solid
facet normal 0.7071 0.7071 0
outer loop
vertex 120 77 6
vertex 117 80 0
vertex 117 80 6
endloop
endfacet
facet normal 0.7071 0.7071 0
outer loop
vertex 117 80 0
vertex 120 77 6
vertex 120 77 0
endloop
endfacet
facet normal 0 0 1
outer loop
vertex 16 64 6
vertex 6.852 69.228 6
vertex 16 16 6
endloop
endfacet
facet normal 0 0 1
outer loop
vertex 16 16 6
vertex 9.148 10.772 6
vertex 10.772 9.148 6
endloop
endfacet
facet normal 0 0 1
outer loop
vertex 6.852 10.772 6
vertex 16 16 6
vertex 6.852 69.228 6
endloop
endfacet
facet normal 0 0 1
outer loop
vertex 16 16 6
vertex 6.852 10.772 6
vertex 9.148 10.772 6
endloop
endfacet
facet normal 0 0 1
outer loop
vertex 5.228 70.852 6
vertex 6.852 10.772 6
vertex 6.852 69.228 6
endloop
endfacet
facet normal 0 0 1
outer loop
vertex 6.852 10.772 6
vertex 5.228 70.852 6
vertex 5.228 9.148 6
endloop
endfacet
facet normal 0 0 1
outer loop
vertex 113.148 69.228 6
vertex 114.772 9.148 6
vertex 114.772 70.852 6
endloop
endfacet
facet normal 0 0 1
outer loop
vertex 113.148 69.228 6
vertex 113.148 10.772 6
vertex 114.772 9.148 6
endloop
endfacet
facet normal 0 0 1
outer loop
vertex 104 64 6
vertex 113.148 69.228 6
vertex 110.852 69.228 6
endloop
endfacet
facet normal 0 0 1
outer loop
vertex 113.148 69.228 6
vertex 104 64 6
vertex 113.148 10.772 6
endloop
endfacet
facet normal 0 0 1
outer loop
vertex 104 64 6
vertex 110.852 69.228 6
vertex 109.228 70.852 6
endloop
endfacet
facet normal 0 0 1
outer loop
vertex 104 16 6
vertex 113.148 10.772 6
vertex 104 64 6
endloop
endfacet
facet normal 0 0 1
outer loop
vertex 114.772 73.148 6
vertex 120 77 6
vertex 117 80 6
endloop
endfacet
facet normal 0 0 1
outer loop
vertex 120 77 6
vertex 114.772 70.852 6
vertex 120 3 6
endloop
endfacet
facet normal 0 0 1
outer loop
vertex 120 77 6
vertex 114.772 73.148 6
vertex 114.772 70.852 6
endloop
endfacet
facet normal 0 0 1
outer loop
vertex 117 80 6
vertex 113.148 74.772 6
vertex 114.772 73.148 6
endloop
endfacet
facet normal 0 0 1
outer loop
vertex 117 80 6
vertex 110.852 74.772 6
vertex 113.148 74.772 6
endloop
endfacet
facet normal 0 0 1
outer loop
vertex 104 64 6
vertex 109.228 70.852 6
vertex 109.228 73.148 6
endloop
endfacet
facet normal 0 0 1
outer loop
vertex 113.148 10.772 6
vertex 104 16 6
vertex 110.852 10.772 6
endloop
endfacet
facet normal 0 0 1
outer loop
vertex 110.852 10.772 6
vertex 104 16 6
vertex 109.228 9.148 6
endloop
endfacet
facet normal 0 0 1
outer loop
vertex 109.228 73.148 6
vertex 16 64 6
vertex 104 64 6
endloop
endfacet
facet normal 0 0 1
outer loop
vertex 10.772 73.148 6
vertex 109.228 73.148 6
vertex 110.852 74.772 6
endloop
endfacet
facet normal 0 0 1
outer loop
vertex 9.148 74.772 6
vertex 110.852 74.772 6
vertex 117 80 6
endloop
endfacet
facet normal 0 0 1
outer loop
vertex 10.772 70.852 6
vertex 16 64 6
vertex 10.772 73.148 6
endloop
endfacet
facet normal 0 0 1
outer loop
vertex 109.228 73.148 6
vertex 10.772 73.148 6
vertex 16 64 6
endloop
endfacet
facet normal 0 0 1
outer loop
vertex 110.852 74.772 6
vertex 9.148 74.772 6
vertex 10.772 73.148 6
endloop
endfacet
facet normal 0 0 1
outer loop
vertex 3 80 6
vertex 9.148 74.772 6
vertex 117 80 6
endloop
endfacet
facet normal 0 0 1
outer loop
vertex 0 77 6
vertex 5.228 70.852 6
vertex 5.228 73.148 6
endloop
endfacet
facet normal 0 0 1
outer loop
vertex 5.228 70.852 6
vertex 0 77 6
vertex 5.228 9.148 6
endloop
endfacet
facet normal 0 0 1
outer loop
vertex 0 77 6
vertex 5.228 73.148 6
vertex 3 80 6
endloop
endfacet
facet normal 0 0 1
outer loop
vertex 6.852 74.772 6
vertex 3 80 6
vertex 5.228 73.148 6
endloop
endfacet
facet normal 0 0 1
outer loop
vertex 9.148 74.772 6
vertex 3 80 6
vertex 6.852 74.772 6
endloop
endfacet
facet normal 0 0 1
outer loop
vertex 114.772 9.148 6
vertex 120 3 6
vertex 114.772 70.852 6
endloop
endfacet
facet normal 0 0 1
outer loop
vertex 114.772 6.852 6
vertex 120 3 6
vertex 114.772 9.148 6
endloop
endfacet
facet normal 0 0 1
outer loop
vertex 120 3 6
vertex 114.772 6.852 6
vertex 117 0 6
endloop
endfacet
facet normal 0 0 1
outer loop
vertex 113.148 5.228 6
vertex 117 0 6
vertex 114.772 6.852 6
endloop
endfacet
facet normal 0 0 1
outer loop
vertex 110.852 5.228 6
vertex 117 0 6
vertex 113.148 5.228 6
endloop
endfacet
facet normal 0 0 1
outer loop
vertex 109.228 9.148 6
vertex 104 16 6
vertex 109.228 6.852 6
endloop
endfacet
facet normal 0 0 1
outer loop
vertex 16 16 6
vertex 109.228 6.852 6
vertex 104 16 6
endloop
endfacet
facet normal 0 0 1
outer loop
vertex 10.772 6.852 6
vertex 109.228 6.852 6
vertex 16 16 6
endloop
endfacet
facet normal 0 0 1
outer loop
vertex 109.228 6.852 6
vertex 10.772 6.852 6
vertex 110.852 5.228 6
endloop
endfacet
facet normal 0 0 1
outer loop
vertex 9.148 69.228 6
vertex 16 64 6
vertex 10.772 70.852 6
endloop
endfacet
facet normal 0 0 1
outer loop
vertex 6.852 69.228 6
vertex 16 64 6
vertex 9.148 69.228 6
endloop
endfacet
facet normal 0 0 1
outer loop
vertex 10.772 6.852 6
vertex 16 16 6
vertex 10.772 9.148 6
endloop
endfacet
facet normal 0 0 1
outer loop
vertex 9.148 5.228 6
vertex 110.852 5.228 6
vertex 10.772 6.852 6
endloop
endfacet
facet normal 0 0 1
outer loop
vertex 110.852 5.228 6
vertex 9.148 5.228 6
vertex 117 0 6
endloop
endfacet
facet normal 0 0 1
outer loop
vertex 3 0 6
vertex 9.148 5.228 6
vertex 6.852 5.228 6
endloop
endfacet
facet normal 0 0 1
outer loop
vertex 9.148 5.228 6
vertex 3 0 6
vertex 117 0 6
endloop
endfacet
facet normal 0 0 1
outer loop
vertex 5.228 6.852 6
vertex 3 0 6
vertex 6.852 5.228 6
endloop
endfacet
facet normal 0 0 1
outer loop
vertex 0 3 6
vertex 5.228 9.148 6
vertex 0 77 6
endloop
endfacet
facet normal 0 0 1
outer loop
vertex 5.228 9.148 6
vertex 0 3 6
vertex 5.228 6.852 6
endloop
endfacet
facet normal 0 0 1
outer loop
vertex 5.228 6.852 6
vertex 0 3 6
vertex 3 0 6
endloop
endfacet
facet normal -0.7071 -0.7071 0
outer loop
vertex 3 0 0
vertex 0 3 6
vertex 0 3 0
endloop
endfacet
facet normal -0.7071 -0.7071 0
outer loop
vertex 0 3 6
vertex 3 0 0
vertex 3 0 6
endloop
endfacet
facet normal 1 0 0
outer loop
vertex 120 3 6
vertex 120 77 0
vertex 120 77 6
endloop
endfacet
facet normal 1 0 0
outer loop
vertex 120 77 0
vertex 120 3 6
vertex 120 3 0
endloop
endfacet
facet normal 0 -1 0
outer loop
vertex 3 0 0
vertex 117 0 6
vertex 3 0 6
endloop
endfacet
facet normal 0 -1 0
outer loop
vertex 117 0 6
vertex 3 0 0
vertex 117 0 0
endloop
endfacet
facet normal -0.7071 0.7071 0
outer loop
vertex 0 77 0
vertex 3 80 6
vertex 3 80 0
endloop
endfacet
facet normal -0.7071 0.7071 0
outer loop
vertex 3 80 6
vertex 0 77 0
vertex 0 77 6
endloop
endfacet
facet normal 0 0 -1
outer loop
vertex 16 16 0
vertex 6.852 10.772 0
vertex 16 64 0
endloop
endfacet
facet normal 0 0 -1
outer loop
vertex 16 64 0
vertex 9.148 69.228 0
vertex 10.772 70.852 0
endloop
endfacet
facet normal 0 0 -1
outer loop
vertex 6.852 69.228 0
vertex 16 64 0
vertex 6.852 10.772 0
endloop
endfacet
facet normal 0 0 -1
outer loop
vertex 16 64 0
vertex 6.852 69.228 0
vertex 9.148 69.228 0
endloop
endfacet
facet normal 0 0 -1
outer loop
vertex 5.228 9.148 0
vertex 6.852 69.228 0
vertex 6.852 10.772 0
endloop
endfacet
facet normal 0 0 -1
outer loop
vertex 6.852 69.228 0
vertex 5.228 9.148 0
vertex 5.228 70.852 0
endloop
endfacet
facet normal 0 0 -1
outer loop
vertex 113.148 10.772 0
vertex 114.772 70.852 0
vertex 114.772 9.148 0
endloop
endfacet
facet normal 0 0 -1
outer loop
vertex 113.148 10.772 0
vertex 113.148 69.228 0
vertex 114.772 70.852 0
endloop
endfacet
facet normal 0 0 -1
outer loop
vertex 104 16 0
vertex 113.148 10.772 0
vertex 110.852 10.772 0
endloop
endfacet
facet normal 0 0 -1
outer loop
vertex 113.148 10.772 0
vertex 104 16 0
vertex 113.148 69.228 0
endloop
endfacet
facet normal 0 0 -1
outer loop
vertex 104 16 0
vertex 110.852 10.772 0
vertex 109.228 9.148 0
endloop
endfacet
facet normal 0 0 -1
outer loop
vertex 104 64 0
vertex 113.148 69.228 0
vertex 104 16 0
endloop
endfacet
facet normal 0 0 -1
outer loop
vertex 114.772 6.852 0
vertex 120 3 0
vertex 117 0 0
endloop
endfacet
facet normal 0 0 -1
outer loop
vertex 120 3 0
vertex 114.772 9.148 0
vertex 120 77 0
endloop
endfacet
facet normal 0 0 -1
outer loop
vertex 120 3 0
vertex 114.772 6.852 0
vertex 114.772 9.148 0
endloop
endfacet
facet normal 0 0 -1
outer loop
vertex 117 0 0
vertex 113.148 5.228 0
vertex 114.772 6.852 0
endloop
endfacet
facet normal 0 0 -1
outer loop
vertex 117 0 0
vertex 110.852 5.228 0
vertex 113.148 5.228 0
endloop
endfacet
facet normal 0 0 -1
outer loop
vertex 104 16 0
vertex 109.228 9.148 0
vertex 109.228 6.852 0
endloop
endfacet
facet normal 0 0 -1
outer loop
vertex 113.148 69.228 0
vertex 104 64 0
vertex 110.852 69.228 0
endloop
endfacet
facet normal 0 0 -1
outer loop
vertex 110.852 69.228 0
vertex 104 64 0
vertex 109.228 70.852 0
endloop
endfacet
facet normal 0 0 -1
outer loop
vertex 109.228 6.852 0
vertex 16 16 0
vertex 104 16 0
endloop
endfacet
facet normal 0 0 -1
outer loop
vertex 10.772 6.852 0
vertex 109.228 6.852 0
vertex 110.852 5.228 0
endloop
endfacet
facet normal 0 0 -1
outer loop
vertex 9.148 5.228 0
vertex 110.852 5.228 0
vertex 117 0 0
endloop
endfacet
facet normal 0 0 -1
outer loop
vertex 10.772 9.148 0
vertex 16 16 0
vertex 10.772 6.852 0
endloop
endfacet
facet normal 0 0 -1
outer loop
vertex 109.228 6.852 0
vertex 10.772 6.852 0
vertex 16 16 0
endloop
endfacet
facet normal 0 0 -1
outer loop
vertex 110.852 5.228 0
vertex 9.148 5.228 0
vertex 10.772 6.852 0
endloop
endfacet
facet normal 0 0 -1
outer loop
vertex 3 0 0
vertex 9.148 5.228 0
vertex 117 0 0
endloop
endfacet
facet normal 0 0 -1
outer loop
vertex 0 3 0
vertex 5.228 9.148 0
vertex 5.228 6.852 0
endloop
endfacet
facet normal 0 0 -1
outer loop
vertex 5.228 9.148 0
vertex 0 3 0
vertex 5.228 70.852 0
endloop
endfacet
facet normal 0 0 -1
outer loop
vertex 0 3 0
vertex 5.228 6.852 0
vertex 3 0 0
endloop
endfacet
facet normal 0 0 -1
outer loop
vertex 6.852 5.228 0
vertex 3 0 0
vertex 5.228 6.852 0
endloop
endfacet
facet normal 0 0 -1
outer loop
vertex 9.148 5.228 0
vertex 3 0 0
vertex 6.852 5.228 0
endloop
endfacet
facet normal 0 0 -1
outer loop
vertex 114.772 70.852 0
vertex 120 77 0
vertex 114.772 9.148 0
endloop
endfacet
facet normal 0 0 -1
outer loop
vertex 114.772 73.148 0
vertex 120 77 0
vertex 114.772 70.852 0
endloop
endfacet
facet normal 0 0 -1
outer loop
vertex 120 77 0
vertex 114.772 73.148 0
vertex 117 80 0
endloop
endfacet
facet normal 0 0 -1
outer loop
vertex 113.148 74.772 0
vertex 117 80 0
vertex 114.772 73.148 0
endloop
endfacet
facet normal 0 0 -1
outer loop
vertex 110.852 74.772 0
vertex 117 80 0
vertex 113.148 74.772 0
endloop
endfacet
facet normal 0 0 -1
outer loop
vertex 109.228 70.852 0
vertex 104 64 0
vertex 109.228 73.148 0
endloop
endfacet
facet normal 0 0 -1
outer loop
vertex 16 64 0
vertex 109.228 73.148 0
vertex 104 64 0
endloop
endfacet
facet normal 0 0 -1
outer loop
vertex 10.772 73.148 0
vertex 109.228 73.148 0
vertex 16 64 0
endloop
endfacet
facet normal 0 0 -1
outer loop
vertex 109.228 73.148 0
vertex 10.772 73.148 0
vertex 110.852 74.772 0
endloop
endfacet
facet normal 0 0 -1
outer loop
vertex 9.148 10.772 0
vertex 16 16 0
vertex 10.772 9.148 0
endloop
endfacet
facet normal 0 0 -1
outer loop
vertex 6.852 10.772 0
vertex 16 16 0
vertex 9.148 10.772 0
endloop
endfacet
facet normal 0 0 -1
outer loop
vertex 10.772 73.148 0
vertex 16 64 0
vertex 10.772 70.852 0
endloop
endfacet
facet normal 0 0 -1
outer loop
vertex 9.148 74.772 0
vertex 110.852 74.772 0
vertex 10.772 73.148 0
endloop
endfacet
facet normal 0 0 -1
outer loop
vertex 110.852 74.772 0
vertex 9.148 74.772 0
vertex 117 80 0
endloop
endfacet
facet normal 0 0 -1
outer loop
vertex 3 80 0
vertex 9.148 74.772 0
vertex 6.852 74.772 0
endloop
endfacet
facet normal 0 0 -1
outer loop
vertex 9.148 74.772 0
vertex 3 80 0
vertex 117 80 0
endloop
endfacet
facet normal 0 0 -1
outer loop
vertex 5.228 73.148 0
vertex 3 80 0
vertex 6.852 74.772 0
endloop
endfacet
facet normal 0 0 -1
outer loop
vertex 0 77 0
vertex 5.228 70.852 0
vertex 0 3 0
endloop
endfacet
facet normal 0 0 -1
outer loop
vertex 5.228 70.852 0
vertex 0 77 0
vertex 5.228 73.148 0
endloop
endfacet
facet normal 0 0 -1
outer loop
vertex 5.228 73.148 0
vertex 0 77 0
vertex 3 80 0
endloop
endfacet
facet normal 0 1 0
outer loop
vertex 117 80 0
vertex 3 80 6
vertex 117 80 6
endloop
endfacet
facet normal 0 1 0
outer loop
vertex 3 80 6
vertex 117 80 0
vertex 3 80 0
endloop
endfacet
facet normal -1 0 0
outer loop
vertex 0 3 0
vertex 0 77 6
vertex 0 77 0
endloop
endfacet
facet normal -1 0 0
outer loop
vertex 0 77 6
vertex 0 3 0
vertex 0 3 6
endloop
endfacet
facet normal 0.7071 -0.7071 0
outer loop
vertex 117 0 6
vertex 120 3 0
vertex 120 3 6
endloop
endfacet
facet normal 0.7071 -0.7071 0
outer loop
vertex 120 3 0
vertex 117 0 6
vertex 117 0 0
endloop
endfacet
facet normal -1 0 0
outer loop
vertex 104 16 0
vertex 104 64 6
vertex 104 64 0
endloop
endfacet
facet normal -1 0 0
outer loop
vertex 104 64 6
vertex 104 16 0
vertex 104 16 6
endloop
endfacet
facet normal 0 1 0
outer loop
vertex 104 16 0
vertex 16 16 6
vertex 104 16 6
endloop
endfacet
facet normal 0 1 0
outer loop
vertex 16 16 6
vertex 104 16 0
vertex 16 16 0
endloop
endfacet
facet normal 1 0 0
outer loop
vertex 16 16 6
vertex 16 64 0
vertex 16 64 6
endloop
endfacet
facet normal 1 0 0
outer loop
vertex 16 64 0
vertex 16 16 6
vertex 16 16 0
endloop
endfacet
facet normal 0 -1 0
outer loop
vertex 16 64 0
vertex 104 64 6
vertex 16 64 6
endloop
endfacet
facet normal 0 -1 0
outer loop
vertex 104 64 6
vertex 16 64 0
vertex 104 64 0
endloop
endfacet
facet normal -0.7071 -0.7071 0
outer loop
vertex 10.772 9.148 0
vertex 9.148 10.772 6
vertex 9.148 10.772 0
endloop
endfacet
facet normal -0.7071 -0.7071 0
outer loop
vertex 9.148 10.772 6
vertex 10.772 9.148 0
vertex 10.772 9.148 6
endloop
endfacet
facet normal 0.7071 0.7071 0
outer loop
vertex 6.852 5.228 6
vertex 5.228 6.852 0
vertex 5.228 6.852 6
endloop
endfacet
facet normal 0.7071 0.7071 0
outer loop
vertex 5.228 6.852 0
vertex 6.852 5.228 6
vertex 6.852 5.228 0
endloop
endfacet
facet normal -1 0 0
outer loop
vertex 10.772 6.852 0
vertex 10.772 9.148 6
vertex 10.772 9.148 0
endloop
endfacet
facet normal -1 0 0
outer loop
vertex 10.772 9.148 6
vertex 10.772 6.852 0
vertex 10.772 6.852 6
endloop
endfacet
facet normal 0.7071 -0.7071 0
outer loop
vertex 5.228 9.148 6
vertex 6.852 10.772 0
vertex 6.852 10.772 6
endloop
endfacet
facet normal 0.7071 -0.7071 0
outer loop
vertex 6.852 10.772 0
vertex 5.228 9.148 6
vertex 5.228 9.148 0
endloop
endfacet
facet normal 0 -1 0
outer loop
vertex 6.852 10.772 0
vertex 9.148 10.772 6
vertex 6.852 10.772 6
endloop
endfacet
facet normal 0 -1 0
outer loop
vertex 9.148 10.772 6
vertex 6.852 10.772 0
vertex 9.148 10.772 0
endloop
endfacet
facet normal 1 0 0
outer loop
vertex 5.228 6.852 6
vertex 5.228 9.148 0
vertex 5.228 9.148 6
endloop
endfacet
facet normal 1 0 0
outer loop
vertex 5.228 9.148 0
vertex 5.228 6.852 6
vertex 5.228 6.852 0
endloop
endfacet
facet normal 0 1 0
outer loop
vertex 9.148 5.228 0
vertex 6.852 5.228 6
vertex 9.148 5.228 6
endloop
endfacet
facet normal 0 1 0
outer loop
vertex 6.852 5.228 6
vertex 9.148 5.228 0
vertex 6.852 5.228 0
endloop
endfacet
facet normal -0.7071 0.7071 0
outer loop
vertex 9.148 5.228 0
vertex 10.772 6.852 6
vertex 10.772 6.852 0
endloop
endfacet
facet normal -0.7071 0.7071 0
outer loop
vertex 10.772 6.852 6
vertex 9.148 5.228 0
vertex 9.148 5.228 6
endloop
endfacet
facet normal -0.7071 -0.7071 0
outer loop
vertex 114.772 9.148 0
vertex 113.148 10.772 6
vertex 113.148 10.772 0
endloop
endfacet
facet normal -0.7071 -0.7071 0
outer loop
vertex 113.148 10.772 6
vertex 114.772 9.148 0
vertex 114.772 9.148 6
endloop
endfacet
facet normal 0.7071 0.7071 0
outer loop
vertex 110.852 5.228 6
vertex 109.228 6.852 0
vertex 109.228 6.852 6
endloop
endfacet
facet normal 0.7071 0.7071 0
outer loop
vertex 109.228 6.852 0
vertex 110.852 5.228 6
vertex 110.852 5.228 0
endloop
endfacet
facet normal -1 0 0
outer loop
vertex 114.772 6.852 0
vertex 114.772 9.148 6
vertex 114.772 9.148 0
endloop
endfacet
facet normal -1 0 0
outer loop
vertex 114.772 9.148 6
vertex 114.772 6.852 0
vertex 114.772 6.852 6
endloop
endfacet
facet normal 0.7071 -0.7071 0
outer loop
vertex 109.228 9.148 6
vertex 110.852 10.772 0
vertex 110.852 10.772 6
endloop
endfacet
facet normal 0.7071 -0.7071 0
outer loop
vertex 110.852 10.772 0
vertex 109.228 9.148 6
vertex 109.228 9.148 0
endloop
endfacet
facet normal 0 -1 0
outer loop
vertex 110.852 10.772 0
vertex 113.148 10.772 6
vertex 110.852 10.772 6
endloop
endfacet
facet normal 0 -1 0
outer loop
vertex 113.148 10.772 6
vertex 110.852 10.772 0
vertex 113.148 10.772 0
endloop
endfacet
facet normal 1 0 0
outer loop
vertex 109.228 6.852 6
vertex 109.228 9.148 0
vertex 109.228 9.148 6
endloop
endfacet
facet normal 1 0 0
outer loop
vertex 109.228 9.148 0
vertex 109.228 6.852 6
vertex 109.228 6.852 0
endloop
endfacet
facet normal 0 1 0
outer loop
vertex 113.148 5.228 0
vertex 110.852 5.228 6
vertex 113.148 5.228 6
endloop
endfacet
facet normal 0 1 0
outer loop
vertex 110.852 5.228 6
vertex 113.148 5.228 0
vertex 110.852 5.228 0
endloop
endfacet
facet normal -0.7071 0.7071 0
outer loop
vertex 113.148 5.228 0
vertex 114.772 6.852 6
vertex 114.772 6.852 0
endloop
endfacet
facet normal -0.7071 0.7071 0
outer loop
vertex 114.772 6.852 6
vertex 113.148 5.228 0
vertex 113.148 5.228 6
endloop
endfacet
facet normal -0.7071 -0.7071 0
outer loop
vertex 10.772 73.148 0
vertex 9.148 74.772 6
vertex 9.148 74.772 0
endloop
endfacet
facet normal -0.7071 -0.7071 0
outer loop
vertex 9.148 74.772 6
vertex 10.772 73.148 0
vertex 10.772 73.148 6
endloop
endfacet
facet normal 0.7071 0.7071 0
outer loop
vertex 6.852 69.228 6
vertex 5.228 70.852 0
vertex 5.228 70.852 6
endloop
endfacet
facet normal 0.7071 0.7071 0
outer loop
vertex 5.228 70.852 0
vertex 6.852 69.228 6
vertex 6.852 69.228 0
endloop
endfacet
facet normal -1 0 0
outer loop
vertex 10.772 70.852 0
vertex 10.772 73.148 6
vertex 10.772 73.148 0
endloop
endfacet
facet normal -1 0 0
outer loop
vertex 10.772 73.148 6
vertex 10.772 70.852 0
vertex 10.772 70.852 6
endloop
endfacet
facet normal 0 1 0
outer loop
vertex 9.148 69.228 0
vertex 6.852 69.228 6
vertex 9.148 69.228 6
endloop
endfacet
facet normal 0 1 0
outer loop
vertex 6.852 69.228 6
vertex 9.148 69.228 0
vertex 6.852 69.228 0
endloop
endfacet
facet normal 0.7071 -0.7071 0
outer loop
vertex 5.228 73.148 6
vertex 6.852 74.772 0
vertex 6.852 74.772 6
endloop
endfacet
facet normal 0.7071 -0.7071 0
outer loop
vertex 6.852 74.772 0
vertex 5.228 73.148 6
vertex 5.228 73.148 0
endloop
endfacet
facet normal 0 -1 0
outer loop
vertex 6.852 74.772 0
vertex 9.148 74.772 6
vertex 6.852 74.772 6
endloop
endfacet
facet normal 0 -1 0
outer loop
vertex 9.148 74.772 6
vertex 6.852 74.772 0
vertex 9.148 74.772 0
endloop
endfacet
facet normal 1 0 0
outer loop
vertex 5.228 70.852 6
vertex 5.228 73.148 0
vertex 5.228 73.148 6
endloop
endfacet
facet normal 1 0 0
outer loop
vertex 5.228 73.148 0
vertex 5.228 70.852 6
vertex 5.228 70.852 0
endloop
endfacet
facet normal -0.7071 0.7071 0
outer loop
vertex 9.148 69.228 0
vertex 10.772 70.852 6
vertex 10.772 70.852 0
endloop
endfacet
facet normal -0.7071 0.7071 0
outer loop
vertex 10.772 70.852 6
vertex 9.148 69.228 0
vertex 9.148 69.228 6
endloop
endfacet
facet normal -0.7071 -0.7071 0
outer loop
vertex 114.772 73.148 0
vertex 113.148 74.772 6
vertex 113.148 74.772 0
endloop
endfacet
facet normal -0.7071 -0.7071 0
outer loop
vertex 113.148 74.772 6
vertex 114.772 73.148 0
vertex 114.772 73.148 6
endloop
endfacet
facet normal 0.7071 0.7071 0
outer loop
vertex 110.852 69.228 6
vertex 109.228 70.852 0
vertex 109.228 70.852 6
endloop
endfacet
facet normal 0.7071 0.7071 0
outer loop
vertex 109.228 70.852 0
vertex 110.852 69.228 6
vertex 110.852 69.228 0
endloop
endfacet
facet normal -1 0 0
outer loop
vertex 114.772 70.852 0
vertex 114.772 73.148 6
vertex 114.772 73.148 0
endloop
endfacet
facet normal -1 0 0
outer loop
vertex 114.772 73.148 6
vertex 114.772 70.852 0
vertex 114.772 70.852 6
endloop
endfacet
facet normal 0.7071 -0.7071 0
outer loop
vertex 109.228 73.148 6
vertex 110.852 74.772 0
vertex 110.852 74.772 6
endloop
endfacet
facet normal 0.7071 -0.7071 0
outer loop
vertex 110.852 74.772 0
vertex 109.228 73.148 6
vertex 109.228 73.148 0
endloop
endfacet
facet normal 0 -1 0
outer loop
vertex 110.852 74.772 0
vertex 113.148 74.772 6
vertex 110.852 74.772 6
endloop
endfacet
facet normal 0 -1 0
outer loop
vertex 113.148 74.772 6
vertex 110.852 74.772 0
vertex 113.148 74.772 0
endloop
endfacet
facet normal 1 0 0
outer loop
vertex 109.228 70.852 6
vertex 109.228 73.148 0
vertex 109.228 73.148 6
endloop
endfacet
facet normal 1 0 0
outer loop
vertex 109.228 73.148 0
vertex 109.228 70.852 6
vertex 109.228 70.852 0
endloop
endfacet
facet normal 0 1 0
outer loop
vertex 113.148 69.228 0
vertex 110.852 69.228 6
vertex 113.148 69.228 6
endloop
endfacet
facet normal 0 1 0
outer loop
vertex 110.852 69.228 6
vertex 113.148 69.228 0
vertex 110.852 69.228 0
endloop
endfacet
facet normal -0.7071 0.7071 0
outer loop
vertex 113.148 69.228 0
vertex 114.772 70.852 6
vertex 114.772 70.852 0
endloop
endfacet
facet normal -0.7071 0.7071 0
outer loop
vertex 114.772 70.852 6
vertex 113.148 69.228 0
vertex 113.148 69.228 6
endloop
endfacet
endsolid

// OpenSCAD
$fn = 32;

// ----------------------------------------------------------------------
// Frame plate: 120 x 80 frame, 16 mm rails
// ----------------------------------------------------------------------

// --- parameters (mm) ---
plate_l = 120;            // plate length, X
plate_w = 80;             // plate width, Y
plate_t = 6;              // plate thickness, Z (extrusion height)
corner_c = 3;             // corner chamfer
frame_bar = 16;           // frame rail width
bolt_r = 3;               // corner bolt window radius
bolt_inset = 8;           // bolt centre inset from the edges

win_l = plate_l - 2 * frame_bar;  // window length
win_w = plate_w - 2 * frame_bar;  // window width
bolt_d = 2 * bolt_r;  // corner hole diameter

profile = [[3, 0], [117, 0], [120, 3], [120, 77], [117, 80], [3, 80], [0, 77], [0, 3]];  // primary outline, 8 points, counter clockwise
void_1 = [[16, 16], [104, 16], [104, 64], [16, 64]];  // the window, 4 points
void_2 = [[10.772, 9.148], [9.148, 10.772], [6.852, 10.772], [5.228, 9.148], [5.228, 6.852], [6.852, 5.228], [9.148, 5.228], [10.772, 6.852]];  // corner bolt window, 8 points
void_3 = [[114.772, 9.148], [113.148, 10.772], [110.852, 10.772], [109.228, 9.148], [109.228, 6.852], [110.852, 5.228], [113.148, 5.228], [114.772, 6.852]];  // corner bolt window, 8 points
void_4 = [[10.772, 73.148], [9.148, 74.772], [6.852, 74.772], [5.228, 73.148], [5.228, 70.852], [6.852, 69.228], [9.148, 69.228], [10.772, 70.852]];  // corner bolt window, 8 points
void_5 = [[114.772, 73.148], [113.148, 74.772], [110.852, 74.772], [109.228, 73.148], [109.228, 70.852], [110.852, 69.228], [113.148, 69.228], [114.772, 70.852]];  // corner bolt window, 8 points

// --- the one profile operation ---
difference() {
  linear_extrude(height = plate_t) polygon(points = profile);
  translate([0, 0, -1])
    linear_extrude(height = plate_t + 2) polygon(points = void_1);
  translate([0, 0, -1])
    linear_extrude(height = plate_t + 2) polygon(points = void_2);
  translate([0, 0, -1])
    linear_extrude(height = plate_t + 2) polygon(points = void_3);
  translate([0, 0, -1])
    linear_extrude(height = plate_t + 2) polygon(points = void_4);
  translate([0, 0, -1])
    linear_extrude(height = plate_t + 2) polygon(points = void_5);
}
